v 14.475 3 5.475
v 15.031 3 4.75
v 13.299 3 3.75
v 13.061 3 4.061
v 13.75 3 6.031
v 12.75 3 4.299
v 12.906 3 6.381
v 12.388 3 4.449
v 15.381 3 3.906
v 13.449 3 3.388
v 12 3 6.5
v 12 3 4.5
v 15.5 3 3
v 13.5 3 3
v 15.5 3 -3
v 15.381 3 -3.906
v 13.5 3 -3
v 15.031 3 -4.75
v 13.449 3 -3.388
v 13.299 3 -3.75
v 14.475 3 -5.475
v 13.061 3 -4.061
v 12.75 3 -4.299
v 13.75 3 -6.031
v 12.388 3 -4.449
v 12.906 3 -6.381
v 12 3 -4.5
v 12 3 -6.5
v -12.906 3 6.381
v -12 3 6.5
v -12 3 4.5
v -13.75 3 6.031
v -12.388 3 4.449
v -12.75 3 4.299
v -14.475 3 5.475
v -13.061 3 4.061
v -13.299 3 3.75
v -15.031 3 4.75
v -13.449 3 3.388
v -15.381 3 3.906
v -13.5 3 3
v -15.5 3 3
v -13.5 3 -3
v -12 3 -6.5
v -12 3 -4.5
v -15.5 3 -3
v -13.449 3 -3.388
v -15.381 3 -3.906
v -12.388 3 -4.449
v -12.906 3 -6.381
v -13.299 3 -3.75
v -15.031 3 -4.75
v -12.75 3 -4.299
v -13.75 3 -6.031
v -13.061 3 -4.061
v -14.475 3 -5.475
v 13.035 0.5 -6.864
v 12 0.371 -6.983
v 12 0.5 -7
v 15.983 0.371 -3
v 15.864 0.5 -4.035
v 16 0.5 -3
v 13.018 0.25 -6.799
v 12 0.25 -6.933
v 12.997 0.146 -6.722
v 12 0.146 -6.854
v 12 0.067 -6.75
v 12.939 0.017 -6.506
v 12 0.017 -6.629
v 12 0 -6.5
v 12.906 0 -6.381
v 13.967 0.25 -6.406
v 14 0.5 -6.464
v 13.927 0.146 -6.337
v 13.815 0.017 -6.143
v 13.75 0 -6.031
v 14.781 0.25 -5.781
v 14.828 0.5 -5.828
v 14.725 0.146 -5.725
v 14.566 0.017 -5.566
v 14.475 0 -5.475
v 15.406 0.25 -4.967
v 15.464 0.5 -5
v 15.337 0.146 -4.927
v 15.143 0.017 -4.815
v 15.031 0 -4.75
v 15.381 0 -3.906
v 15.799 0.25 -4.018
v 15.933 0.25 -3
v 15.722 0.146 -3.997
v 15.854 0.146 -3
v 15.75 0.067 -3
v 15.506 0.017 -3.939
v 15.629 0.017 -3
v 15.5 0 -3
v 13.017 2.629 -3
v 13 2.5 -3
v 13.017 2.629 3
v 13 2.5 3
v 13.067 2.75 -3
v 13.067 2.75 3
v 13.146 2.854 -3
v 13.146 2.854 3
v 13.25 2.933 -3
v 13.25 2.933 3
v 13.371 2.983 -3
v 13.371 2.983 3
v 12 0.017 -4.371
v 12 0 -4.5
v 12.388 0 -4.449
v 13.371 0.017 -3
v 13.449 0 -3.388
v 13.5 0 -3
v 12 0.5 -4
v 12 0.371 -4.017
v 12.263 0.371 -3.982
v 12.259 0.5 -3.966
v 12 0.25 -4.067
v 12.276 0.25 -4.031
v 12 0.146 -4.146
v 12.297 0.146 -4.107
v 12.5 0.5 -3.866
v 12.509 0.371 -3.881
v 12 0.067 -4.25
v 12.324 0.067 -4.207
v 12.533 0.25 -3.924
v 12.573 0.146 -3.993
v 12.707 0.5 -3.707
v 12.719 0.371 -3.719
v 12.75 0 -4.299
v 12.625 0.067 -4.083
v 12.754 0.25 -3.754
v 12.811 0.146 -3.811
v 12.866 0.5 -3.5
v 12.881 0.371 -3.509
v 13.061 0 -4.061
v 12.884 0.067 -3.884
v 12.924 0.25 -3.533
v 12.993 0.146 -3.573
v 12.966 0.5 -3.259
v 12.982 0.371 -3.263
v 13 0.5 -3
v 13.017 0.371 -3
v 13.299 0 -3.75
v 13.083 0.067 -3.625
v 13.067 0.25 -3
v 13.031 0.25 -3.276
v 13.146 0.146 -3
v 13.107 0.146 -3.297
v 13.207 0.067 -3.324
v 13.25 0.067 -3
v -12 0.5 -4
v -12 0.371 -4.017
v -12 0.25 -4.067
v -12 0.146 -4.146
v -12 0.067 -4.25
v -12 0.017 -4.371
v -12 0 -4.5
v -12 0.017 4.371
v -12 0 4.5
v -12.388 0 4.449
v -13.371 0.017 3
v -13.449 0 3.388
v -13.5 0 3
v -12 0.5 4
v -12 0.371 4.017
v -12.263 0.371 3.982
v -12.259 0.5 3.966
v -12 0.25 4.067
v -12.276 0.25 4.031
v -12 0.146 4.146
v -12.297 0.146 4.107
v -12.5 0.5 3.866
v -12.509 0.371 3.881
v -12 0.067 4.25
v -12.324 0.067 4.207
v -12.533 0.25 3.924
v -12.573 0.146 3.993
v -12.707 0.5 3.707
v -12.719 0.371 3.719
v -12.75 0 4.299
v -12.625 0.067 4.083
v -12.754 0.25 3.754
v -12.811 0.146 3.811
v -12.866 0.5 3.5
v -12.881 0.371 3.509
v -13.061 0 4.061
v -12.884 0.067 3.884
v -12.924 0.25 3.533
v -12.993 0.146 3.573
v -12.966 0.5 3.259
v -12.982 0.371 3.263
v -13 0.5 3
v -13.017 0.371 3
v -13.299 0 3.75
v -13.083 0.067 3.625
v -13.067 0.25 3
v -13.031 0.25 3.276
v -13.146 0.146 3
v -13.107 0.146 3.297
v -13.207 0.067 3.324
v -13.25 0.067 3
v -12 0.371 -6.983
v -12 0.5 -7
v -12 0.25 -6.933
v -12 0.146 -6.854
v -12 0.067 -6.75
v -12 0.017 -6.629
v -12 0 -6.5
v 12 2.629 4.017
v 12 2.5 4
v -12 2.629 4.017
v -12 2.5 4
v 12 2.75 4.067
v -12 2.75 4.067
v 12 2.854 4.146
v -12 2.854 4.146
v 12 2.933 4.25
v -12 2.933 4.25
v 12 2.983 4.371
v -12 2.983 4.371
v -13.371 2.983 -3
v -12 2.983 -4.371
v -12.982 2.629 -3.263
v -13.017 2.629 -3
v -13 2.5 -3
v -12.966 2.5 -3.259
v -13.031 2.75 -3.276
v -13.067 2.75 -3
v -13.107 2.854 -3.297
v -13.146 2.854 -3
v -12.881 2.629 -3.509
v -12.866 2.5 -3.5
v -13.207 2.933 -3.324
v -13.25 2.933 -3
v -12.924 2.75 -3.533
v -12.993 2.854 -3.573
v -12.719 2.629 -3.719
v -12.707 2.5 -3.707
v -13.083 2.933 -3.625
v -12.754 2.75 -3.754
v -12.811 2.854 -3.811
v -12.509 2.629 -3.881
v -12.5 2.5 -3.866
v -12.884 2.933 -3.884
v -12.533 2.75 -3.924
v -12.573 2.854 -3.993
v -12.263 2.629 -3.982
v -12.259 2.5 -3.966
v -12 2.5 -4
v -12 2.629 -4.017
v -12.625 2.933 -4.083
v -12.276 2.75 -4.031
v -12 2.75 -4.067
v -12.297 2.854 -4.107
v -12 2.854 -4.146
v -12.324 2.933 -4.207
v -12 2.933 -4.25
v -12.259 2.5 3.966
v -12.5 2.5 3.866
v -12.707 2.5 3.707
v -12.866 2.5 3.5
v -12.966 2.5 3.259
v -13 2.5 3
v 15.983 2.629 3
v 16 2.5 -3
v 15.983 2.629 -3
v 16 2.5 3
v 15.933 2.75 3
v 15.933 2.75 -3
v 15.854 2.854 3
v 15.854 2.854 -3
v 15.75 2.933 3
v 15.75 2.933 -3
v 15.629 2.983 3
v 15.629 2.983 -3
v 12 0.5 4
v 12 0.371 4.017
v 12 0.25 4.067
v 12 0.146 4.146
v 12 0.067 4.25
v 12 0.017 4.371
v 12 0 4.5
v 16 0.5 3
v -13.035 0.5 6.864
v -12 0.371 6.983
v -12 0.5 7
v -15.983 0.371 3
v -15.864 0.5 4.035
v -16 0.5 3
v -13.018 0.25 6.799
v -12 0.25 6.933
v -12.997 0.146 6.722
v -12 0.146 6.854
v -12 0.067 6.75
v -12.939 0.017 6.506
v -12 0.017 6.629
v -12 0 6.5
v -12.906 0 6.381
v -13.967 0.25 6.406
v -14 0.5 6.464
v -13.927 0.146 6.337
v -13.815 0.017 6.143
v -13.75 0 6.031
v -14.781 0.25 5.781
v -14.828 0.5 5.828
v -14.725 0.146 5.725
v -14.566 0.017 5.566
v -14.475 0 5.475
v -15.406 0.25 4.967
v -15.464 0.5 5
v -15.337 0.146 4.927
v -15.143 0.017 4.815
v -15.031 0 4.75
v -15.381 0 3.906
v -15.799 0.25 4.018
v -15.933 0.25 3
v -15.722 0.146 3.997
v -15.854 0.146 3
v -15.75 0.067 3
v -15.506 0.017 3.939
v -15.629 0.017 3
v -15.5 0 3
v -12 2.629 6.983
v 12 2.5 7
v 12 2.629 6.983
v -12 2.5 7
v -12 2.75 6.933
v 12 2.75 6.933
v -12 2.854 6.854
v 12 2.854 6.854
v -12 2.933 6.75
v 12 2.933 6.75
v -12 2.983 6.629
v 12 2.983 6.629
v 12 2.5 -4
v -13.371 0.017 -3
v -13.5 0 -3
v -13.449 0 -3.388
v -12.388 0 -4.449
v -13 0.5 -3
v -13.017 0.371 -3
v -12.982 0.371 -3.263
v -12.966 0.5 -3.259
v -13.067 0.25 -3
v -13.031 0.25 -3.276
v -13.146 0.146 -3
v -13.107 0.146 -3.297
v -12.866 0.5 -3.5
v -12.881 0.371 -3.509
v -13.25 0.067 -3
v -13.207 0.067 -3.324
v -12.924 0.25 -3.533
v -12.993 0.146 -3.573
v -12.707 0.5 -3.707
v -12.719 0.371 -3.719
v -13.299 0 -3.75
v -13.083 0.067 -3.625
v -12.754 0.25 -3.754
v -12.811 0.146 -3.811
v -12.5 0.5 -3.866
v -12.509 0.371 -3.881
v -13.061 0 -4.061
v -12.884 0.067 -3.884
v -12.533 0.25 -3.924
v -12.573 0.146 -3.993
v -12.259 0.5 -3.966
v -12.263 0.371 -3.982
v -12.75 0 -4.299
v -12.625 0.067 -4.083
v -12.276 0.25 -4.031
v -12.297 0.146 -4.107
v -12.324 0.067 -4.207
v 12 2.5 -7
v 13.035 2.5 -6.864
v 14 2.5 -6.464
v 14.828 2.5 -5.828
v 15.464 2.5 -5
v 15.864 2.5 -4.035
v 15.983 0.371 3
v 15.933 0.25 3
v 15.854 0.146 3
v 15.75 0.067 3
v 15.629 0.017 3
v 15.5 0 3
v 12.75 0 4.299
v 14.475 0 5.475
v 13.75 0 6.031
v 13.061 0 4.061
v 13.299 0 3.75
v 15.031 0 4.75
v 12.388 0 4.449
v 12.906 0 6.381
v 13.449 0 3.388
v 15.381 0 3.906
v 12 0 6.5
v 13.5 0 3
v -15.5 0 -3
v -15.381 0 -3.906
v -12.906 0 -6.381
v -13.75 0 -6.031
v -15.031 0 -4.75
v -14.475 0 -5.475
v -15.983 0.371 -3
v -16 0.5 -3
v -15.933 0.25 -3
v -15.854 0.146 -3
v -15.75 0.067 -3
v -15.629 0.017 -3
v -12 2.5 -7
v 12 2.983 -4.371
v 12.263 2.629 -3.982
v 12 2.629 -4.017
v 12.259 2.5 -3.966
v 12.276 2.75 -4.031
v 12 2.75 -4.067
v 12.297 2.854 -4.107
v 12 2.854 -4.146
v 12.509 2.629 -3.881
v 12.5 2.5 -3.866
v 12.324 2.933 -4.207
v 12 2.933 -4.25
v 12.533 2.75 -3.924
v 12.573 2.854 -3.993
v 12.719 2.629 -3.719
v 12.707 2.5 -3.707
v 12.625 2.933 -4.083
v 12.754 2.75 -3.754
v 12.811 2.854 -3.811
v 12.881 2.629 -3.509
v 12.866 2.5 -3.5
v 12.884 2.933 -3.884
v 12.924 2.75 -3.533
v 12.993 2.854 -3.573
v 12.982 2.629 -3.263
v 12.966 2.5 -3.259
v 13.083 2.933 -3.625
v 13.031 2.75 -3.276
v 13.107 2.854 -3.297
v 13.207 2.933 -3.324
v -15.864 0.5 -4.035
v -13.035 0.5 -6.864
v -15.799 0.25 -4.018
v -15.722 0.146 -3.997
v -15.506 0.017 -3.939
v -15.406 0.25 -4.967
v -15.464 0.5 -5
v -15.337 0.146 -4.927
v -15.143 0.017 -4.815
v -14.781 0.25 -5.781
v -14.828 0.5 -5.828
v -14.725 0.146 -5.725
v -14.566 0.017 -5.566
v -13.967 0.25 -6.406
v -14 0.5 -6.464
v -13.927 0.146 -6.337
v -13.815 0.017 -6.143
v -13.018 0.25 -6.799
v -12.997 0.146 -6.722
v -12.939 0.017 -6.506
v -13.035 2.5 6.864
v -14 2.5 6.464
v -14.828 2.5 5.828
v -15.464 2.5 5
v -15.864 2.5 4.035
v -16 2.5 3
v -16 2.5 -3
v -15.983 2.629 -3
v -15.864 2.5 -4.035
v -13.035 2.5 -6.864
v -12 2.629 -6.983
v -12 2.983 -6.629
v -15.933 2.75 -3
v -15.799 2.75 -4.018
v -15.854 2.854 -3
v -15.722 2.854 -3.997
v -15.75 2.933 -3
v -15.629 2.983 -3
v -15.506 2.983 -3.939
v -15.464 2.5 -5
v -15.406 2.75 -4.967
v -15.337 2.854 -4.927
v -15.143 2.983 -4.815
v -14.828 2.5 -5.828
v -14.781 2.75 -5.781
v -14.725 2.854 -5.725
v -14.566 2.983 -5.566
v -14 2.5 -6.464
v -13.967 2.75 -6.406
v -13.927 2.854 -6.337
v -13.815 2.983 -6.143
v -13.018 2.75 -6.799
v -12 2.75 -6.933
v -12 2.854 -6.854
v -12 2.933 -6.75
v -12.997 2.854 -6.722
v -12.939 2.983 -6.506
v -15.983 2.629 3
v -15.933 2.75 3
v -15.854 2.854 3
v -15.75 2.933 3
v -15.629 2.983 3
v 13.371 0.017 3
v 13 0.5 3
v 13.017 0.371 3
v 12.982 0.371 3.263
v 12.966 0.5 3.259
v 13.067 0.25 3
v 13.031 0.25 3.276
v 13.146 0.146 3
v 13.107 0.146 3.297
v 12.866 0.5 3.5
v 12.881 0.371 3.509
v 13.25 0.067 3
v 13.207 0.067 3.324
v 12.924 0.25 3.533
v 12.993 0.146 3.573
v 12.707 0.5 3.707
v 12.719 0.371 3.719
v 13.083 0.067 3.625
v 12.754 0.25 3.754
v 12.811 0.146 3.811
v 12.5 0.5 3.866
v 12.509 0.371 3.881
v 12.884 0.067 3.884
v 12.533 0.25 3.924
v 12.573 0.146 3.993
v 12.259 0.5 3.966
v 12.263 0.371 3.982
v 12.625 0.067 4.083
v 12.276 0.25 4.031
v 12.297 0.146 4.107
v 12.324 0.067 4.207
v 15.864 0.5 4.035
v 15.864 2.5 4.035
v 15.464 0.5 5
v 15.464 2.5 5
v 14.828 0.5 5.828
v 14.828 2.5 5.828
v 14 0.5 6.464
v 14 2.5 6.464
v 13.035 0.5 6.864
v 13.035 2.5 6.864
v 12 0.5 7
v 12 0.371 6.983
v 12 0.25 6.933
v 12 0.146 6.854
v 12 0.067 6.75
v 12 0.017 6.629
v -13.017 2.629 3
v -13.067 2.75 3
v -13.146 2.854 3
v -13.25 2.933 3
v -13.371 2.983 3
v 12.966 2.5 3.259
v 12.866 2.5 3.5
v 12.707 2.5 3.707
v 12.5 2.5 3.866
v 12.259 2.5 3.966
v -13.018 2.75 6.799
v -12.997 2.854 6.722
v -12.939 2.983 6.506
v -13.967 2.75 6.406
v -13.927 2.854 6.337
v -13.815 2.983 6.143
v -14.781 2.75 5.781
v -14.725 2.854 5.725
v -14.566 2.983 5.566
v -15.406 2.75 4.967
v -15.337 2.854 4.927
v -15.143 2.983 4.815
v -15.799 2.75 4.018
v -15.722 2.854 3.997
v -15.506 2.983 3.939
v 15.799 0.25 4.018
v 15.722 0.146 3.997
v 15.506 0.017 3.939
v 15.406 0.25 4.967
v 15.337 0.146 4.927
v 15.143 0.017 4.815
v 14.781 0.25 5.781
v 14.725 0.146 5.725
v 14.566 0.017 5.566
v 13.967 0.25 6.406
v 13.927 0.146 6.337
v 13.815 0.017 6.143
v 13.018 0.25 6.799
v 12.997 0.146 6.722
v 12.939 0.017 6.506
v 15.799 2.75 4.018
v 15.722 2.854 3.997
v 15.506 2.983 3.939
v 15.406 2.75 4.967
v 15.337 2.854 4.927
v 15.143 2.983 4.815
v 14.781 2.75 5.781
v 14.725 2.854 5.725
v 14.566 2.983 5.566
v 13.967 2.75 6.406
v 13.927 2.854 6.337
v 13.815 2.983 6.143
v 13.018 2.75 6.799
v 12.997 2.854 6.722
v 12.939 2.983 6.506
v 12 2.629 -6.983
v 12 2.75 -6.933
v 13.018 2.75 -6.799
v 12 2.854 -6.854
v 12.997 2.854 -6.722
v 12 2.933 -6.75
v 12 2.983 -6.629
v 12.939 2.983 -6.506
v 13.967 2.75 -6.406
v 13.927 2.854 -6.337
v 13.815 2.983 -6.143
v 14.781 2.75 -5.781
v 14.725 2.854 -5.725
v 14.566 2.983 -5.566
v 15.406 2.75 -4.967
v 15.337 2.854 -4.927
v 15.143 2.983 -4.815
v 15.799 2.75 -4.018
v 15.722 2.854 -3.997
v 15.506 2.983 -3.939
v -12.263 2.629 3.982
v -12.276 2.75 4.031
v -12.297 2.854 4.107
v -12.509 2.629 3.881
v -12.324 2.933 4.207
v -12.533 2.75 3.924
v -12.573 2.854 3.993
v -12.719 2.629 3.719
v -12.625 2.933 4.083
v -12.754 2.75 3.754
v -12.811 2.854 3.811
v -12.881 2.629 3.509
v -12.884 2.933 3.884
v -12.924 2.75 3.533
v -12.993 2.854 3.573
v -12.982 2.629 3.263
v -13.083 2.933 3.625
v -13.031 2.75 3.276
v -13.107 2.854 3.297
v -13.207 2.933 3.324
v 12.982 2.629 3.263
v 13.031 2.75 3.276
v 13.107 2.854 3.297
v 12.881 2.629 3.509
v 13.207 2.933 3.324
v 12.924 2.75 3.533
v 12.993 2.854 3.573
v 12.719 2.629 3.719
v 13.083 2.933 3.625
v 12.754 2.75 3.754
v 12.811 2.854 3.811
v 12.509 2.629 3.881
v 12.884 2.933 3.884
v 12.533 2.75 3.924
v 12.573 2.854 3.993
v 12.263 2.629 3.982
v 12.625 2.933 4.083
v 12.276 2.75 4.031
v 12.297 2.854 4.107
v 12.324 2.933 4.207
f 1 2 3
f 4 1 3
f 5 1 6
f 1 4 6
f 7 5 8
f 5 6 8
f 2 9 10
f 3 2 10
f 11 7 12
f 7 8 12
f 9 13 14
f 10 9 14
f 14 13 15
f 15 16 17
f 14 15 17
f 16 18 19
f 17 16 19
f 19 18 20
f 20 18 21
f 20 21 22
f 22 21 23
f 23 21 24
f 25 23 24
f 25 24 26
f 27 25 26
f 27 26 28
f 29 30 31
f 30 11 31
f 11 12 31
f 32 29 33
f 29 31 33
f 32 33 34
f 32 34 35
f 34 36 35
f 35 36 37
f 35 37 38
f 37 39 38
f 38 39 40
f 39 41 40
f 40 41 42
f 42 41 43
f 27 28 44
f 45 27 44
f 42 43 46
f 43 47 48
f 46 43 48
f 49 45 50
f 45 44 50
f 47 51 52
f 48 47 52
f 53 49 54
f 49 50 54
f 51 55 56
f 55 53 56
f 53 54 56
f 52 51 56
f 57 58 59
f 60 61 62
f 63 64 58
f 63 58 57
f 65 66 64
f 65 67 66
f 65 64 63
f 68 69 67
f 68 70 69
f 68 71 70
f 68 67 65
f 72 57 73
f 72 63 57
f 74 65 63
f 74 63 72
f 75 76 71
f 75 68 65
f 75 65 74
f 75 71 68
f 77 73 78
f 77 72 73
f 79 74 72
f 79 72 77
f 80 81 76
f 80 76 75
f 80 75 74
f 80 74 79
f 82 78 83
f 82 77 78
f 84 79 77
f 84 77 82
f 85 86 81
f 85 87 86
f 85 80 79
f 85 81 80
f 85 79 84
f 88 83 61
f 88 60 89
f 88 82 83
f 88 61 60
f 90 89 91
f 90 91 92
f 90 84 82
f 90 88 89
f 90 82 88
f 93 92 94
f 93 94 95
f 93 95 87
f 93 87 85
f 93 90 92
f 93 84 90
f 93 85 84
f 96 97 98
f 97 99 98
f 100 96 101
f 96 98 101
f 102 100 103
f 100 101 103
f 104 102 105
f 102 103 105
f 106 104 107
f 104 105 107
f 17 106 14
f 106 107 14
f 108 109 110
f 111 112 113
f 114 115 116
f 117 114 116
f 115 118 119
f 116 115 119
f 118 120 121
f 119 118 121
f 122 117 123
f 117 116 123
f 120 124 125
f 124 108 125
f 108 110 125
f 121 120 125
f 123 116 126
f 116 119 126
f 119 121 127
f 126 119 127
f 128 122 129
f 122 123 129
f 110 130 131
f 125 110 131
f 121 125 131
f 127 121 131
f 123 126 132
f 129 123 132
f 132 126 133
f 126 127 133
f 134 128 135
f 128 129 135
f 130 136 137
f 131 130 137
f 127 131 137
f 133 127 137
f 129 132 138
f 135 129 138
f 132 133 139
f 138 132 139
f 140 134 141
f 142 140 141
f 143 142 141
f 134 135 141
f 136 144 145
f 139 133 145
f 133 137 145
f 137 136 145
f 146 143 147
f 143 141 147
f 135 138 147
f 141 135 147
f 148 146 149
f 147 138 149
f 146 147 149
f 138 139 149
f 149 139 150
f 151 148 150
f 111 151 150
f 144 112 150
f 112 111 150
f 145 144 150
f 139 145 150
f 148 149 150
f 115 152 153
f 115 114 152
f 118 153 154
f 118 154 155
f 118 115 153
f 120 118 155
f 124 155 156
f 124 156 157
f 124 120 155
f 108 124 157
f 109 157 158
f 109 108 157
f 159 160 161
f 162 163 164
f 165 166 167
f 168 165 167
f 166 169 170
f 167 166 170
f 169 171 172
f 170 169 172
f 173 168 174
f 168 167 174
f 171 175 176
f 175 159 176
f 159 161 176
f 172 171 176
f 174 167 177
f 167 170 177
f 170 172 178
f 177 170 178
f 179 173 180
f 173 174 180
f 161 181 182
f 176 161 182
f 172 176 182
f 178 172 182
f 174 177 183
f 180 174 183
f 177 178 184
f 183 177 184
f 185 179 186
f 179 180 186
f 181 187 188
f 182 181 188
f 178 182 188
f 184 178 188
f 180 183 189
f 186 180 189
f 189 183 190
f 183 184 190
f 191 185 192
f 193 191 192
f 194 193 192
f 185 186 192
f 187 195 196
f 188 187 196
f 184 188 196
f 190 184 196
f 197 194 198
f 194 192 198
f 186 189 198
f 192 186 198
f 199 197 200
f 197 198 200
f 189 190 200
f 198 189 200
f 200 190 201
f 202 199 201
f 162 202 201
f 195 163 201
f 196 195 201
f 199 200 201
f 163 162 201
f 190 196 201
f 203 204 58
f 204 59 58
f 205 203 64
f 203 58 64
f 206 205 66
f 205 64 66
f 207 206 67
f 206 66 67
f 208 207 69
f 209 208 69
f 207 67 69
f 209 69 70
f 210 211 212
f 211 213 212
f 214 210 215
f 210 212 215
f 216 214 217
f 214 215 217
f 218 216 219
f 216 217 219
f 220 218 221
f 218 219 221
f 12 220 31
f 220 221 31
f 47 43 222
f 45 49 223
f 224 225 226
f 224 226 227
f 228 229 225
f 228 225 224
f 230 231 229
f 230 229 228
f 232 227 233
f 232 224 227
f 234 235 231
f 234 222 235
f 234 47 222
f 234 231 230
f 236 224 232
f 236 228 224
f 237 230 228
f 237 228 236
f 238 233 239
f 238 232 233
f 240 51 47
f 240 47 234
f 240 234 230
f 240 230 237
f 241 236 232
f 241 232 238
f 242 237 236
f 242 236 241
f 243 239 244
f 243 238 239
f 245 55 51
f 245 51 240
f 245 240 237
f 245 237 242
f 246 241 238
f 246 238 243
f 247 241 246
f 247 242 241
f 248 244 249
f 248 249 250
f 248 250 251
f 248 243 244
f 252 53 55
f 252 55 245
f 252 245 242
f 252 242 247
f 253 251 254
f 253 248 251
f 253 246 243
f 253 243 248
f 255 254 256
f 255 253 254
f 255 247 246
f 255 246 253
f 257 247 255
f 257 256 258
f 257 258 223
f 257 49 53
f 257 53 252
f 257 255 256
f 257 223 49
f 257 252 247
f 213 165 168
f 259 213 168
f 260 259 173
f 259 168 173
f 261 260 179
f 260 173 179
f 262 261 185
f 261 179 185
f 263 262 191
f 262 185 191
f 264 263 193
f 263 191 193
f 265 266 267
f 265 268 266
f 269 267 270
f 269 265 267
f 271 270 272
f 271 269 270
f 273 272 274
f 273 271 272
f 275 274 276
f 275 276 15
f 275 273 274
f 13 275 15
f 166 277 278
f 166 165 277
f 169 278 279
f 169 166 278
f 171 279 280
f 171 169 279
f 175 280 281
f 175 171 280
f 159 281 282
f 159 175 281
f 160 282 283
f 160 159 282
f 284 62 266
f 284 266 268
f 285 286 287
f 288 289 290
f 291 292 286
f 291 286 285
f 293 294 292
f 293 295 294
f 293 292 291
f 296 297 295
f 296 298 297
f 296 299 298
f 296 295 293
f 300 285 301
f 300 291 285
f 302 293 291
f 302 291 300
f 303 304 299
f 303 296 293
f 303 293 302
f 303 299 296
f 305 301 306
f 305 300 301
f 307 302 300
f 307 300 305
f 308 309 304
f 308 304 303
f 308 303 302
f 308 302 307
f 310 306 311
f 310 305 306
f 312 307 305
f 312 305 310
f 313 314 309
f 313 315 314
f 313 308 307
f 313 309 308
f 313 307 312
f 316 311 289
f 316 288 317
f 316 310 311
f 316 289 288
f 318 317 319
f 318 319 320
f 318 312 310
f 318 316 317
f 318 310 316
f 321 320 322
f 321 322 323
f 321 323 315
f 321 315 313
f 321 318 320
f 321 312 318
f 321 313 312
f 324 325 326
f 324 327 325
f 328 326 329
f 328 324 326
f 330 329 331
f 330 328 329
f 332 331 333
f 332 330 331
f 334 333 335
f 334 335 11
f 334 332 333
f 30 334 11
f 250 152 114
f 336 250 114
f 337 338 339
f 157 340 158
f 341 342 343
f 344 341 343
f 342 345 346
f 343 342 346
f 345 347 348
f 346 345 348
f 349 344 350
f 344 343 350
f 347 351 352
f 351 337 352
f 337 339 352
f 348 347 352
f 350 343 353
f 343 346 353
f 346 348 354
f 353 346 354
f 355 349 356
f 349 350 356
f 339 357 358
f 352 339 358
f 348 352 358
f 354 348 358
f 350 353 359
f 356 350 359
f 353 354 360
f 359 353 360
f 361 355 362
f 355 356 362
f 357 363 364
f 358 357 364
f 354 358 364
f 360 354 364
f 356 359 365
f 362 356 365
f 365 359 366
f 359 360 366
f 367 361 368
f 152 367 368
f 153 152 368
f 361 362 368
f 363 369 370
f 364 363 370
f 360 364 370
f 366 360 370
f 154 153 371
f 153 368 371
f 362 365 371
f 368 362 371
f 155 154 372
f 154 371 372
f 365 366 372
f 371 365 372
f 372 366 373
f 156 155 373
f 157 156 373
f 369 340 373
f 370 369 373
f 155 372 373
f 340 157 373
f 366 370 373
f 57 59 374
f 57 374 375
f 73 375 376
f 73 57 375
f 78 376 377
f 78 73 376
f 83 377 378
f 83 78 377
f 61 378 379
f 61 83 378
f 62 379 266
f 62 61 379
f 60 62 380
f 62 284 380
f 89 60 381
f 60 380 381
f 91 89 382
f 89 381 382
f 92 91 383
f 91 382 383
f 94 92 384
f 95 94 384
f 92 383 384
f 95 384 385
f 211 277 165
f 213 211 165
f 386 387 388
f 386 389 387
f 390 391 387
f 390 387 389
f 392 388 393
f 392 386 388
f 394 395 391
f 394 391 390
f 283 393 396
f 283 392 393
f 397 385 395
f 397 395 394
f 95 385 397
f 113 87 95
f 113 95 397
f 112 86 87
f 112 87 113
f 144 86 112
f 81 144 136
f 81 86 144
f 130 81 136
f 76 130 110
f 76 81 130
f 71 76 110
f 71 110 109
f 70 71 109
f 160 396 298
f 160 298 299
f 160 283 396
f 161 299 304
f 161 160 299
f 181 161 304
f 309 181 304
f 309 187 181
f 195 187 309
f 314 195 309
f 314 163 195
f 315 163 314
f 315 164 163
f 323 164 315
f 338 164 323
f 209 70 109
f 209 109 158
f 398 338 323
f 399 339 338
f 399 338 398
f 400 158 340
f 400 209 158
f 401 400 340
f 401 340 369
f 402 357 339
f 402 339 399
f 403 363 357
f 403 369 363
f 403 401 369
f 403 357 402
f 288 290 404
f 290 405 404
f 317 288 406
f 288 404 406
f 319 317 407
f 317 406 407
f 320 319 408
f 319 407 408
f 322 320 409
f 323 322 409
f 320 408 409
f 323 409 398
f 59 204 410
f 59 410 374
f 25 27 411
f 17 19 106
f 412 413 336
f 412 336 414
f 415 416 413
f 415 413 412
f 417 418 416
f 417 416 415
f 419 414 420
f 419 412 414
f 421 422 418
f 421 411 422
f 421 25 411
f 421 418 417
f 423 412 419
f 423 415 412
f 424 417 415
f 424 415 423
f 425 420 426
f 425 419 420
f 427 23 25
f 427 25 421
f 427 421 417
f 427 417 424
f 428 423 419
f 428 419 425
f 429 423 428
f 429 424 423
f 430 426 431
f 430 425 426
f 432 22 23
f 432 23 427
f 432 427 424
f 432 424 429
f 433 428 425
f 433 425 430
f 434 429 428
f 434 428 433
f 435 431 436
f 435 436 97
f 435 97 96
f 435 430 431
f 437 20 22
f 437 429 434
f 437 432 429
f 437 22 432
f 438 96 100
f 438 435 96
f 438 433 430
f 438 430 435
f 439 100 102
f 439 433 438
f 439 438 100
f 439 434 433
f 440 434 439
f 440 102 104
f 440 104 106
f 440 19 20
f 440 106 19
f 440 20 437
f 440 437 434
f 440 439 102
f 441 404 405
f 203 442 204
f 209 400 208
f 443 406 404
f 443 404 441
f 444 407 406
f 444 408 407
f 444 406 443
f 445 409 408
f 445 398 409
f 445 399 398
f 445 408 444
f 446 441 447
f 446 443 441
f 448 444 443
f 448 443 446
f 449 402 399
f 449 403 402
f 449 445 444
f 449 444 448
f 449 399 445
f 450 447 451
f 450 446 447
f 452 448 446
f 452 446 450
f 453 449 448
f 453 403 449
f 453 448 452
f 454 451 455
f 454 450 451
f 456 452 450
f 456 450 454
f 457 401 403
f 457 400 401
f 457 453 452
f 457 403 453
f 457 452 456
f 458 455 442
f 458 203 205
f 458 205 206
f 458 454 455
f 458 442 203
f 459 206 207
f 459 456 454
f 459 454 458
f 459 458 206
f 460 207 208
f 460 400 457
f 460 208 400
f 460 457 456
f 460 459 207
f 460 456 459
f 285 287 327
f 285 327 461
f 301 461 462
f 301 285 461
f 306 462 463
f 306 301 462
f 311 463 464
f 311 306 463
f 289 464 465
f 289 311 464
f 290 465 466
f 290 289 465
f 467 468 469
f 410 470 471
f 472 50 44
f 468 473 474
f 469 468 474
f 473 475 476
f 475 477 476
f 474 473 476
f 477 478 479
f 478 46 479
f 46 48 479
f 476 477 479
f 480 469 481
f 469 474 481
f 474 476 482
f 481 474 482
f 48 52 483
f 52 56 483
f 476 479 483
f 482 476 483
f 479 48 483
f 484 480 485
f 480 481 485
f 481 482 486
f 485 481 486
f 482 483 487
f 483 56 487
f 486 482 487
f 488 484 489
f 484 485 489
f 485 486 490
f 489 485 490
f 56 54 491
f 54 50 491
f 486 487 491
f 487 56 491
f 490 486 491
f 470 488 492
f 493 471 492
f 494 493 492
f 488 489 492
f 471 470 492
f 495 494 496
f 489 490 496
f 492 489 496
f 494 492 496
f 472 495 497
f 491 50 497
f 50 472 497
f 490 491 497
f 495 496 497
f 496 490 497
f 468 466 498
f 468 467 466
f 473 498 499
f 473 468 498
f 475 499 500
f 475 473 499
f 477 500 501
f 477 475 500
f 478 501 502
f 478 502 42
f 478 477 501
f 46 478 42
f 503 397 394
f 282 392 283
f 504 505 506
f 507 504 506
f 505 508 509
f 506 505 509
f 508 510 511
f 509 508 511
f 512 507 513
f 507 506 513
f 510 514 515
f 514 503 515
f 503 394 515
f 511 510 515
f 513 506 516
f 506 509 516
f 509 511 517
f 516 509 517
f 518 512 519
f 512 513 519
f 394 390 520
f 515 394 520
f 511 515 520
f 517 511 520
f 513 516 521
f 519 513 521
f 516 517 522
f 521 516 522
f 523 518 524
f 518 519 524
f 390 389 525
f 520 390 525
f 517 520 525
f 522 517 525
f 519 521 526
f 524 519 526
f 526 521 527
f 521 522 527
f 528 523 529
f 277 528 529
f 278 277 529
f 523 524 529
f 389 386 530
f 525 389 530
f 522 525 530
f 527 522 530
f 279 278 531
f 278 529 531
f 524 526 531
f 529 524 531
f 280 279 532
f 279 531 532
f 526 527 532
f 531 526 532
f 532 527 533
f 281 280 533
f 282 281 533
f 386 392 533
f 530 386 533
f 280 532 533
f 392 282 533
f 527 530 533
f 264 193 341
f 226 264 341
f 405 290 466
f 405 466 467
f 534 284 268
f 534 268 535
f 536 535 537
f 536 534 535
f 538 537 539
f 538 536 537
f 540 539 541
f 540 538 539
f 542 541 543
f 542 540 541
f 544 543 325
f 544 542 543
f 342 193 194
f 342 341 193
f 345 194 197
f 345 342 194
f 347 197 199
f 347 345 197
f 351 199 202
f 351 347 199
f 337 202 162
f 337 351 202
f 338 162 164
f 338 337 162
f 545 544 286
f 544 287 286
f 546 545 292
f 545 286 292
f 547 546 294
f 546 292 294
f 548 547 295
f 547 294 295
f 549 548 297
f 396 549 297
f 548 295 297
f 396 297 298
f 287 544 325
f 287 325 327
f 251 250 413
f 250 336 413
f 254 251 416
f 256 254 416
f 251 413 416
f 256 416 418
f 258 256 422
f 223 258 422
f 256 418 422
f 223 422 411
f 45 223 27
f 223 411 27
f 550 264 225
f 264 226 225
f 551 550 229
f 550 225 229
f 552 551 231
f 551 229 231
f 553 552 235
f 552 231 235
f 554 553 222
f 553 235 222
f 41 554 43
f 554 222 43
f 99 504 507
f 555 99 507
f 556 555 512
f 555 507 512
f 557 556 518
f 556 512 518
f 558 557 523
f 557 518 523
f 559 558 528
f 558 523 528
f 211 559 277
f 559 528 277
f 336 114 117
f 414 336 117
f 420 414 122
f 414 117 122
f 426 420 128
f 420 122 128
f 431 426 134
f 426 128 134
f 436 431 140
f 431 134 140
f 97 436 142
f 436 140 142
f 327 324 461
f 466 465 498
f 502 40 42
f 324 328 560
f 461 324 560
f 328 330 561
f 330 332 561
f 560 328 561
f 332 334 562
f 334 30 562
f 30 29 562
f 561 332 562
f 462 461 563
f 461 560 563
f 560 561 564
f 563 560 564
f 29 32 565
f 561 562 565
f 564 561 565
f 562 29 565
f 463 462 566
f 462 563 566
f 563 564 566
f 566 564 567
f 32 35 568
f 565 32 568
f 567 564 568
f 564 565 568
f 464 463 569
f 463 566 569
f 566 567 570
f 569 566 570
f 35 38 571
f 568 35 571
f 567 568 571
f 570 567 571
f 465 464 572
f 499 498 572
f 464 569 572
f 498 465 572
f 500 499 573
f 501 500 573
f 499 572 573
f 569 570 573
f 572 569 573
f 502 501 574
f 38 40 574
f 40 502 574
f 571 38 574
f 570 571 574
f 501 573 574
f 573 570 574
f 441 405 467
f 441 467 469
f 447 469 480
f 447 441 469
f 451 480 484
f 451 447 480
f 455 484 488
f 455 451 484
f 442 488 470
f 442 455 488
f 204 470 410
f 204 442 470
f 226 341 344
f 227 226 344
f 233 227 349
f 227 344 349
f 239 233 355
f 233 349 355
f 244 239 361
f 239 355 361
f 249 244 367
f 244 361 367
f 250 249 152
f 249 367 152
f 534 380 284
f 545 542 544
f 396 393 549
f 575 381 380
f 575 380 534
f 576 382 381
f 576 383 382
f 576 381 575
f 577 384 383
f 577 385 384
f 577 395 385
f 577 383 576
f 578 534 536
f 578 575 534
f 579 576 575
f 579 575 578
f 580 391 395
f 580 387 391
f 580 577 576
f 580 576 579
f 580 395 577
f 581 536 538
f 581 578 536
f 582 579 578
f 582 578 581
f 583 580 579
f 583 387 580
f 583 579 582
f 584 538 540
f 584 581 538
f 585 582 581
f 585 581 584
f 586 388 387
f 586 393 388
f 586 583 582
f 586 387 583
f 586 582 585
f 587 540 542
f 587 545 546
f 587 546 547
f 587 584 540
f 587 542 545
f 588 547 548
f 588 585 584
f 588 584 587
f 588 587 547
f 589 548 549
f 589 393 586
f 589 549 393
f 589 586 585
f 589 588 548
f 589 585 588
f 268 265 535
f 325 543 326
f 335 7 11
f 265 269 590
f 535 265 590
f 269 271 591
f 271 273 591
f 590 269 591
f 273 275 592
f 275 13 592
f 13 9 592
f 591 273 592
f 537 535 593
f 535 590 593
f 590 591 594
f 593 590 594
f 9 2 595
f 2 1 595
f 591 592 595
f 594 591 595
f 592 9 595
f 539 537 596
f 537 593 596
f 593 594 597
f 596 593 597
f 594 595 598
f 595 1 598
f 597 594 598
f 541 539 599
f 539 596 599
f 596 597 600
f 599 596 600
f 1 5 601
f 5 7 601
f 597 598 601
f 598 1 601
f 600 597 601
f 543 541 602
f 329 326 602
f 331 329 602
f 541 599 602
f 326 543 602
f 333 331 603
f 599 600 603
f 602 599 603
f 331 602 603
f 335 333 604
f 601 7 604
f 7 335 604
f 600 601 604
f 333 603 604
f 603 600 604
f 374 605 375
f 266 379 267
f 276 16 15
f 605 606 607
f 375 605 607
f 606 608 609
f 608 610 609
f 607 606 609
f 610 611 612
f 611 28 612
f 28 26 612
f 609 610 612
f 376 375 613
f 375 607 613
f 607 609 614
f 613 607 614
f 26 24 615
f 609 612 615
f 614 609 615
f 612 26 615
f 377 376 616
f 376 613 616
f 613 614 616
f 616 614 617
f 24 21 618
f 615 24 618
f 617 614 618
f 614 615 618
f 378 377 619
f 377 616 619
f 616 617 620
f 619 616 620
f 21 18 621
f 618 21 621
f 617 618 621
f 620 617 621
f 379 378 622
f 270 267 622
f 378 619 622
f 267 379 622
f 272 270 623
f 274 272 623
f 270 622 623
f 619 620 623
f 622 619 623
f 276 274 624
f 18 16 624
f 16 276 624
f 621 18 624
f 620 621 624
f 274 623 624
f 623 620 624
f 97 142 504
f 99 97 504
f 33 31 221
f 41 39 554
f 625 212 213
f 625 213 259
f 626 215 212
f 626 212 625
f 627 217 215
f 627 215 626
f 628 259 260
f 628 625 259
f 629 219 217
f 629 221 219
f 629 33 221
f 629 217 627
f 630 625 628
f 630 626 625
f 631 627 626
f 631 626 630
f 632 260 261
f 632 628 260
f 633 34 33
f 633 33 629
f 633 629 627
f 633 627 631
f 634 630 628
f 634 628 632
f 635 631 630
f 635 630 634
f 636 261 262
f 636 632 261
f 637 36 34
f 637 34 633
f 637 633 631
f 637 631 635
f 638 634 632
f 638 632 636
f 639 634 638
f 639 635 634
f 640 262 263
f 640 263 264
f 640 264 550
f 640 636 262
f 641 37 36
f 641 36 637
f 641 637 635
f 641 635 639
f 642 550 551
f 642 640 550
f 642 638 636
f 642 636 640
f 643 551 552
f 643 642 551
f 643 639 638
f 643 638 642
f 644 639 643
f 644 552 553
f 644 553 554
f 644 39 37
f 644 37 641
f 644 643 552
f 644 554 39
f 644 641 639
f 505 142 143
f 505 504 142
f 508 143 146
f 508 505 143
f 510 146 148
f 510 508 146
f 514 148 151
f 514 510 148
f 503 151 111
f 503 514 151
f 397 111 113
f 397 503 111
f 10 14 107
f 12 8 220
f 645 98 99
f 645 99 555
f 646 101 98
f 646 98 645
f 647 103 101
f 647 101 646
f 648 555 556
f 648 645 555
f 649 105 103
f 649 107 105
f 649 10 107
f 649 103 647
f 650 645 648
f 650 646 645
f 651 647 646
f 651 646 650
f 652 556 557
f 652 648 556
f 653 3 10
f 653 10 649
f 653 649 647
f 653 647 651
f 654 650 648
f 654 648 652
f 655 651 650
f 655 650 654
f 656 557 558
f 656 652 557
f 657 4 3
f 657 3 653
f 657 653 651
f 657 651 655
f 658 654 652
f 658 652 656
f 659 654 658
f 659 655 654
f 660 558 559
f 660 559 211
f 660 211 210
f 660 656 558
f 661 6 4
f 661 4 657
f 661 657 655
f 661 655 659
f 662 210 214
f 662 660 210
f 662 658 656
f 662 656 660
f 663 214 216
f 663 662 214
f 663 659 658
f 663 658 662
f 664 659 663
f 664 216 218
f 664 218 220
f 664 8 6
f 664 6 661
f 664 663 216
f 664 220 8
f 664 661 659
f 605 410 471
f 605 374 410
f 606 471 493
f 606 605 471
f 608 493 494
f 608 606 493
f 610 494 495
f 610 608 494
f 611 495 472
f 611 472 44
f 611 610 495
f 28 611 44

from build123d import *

# Parameters (mm, degrees)
BOSS_EXTRUDE1_DEPTH = 3
FILLET1_R           = 0.5


with BuildPart() as part:
    # Sketch1 → Boss-Extrude1 (new body)
    with BuildSketch(Plane(origin=(0, 0, 0), x_dir=(1, 0, 0), z_dir=(0, 1, 0))):
        with BuildLine():
            Line((-12, 7), (12, 7))
            ThreePointArc((12, 7), (14.828427125, 5.828427125), (16, 3))
            Line((16, 3), (16, -3))
            ThreePointArc((16, -3), (14.828427125, -5.828427125), (12, -7))
            Line((12, -7), (-12, -7))
            ThreePointArc((-12, -7), (-14.828427125, -5.828427125), (-16, -3))
            Line((-16, -3), (-16, 3))
            ThreePointArc((-16, 3), (-14.828427125, 5.828427125), (-12, 7))
        make_face()
        with BuildLine():
            Line((-12, 4), (12, 4))
            ThreePointArc((12, 4), (12.707106781, 3.707106781), (13, 3))
            Line((13, 3), (13, -3))
            ThreePointArc((13, -3), (12.707106781, -3.707106781), (12, -4))
            Line((12, -4), (-12, -4))
            ThreePointArc((-12, -4), (-12.707106781, -3.707106781), (-13, -3))
            Line((-13, -3), (-13, 3))
            ThreePointArc((-13, 3), (-12.707106781, 3.707106781), (-12, 4))
        make_face(mode=Mode.SUBTRACT)
    extrude(amount=BOSS_EXTRUDE1_DEPTH)

    # Fillet1
    fillet1_edges = [part.edges().sort_by_distance(p)[0] for p in [
        (-14.828427125, 3, 5.828427125),
        (-16, 0, 0),
        (-14.828427125, 0, -5.828427125),
        (0, 3, 7),
        (14.828427125, 3, 5.828427125),
        (16, 3, 0),
        (14.828427125, 3, -5.828427125),
        (0, 3, -7),
        (12.707106781, 0, -3.707106781),
        (0, 0, -4),
        (-12.707106781, 0, -3.707106781),
        (-13, 0, 0),
        (-12.707106781, 0, 3.707106781),
        (0, 0, 4),
        (12.707106781, 0, 3.707106781),
        (13, 0, 0),
        (12.707106781, 3, -3.707106781),
        (0, 3, -4),
        (-12.707106781, 3, -3.707106781),
        (-13, 3, 0),
        (-12.707106781, 3, 3.707106781),
        (0, 3, 4),
        (12.707106781, 3, 3.707106781),
        (13, 3, 0),
        (-14.828427125, 3, -5.828427125),
        (-16, 3, 0),
        (0, 0, -7),
        (14.828427125, 0, -5.828427125),
        (16, 0, 0),
        (14.828427125, 0, 5.828427125),
        (0, 0, 7),
        (-14.828427125, 0, 5.828427125),
    ]]
    fillet(fillet1_edges, radius=FILLET1_R)


solid = part.part
